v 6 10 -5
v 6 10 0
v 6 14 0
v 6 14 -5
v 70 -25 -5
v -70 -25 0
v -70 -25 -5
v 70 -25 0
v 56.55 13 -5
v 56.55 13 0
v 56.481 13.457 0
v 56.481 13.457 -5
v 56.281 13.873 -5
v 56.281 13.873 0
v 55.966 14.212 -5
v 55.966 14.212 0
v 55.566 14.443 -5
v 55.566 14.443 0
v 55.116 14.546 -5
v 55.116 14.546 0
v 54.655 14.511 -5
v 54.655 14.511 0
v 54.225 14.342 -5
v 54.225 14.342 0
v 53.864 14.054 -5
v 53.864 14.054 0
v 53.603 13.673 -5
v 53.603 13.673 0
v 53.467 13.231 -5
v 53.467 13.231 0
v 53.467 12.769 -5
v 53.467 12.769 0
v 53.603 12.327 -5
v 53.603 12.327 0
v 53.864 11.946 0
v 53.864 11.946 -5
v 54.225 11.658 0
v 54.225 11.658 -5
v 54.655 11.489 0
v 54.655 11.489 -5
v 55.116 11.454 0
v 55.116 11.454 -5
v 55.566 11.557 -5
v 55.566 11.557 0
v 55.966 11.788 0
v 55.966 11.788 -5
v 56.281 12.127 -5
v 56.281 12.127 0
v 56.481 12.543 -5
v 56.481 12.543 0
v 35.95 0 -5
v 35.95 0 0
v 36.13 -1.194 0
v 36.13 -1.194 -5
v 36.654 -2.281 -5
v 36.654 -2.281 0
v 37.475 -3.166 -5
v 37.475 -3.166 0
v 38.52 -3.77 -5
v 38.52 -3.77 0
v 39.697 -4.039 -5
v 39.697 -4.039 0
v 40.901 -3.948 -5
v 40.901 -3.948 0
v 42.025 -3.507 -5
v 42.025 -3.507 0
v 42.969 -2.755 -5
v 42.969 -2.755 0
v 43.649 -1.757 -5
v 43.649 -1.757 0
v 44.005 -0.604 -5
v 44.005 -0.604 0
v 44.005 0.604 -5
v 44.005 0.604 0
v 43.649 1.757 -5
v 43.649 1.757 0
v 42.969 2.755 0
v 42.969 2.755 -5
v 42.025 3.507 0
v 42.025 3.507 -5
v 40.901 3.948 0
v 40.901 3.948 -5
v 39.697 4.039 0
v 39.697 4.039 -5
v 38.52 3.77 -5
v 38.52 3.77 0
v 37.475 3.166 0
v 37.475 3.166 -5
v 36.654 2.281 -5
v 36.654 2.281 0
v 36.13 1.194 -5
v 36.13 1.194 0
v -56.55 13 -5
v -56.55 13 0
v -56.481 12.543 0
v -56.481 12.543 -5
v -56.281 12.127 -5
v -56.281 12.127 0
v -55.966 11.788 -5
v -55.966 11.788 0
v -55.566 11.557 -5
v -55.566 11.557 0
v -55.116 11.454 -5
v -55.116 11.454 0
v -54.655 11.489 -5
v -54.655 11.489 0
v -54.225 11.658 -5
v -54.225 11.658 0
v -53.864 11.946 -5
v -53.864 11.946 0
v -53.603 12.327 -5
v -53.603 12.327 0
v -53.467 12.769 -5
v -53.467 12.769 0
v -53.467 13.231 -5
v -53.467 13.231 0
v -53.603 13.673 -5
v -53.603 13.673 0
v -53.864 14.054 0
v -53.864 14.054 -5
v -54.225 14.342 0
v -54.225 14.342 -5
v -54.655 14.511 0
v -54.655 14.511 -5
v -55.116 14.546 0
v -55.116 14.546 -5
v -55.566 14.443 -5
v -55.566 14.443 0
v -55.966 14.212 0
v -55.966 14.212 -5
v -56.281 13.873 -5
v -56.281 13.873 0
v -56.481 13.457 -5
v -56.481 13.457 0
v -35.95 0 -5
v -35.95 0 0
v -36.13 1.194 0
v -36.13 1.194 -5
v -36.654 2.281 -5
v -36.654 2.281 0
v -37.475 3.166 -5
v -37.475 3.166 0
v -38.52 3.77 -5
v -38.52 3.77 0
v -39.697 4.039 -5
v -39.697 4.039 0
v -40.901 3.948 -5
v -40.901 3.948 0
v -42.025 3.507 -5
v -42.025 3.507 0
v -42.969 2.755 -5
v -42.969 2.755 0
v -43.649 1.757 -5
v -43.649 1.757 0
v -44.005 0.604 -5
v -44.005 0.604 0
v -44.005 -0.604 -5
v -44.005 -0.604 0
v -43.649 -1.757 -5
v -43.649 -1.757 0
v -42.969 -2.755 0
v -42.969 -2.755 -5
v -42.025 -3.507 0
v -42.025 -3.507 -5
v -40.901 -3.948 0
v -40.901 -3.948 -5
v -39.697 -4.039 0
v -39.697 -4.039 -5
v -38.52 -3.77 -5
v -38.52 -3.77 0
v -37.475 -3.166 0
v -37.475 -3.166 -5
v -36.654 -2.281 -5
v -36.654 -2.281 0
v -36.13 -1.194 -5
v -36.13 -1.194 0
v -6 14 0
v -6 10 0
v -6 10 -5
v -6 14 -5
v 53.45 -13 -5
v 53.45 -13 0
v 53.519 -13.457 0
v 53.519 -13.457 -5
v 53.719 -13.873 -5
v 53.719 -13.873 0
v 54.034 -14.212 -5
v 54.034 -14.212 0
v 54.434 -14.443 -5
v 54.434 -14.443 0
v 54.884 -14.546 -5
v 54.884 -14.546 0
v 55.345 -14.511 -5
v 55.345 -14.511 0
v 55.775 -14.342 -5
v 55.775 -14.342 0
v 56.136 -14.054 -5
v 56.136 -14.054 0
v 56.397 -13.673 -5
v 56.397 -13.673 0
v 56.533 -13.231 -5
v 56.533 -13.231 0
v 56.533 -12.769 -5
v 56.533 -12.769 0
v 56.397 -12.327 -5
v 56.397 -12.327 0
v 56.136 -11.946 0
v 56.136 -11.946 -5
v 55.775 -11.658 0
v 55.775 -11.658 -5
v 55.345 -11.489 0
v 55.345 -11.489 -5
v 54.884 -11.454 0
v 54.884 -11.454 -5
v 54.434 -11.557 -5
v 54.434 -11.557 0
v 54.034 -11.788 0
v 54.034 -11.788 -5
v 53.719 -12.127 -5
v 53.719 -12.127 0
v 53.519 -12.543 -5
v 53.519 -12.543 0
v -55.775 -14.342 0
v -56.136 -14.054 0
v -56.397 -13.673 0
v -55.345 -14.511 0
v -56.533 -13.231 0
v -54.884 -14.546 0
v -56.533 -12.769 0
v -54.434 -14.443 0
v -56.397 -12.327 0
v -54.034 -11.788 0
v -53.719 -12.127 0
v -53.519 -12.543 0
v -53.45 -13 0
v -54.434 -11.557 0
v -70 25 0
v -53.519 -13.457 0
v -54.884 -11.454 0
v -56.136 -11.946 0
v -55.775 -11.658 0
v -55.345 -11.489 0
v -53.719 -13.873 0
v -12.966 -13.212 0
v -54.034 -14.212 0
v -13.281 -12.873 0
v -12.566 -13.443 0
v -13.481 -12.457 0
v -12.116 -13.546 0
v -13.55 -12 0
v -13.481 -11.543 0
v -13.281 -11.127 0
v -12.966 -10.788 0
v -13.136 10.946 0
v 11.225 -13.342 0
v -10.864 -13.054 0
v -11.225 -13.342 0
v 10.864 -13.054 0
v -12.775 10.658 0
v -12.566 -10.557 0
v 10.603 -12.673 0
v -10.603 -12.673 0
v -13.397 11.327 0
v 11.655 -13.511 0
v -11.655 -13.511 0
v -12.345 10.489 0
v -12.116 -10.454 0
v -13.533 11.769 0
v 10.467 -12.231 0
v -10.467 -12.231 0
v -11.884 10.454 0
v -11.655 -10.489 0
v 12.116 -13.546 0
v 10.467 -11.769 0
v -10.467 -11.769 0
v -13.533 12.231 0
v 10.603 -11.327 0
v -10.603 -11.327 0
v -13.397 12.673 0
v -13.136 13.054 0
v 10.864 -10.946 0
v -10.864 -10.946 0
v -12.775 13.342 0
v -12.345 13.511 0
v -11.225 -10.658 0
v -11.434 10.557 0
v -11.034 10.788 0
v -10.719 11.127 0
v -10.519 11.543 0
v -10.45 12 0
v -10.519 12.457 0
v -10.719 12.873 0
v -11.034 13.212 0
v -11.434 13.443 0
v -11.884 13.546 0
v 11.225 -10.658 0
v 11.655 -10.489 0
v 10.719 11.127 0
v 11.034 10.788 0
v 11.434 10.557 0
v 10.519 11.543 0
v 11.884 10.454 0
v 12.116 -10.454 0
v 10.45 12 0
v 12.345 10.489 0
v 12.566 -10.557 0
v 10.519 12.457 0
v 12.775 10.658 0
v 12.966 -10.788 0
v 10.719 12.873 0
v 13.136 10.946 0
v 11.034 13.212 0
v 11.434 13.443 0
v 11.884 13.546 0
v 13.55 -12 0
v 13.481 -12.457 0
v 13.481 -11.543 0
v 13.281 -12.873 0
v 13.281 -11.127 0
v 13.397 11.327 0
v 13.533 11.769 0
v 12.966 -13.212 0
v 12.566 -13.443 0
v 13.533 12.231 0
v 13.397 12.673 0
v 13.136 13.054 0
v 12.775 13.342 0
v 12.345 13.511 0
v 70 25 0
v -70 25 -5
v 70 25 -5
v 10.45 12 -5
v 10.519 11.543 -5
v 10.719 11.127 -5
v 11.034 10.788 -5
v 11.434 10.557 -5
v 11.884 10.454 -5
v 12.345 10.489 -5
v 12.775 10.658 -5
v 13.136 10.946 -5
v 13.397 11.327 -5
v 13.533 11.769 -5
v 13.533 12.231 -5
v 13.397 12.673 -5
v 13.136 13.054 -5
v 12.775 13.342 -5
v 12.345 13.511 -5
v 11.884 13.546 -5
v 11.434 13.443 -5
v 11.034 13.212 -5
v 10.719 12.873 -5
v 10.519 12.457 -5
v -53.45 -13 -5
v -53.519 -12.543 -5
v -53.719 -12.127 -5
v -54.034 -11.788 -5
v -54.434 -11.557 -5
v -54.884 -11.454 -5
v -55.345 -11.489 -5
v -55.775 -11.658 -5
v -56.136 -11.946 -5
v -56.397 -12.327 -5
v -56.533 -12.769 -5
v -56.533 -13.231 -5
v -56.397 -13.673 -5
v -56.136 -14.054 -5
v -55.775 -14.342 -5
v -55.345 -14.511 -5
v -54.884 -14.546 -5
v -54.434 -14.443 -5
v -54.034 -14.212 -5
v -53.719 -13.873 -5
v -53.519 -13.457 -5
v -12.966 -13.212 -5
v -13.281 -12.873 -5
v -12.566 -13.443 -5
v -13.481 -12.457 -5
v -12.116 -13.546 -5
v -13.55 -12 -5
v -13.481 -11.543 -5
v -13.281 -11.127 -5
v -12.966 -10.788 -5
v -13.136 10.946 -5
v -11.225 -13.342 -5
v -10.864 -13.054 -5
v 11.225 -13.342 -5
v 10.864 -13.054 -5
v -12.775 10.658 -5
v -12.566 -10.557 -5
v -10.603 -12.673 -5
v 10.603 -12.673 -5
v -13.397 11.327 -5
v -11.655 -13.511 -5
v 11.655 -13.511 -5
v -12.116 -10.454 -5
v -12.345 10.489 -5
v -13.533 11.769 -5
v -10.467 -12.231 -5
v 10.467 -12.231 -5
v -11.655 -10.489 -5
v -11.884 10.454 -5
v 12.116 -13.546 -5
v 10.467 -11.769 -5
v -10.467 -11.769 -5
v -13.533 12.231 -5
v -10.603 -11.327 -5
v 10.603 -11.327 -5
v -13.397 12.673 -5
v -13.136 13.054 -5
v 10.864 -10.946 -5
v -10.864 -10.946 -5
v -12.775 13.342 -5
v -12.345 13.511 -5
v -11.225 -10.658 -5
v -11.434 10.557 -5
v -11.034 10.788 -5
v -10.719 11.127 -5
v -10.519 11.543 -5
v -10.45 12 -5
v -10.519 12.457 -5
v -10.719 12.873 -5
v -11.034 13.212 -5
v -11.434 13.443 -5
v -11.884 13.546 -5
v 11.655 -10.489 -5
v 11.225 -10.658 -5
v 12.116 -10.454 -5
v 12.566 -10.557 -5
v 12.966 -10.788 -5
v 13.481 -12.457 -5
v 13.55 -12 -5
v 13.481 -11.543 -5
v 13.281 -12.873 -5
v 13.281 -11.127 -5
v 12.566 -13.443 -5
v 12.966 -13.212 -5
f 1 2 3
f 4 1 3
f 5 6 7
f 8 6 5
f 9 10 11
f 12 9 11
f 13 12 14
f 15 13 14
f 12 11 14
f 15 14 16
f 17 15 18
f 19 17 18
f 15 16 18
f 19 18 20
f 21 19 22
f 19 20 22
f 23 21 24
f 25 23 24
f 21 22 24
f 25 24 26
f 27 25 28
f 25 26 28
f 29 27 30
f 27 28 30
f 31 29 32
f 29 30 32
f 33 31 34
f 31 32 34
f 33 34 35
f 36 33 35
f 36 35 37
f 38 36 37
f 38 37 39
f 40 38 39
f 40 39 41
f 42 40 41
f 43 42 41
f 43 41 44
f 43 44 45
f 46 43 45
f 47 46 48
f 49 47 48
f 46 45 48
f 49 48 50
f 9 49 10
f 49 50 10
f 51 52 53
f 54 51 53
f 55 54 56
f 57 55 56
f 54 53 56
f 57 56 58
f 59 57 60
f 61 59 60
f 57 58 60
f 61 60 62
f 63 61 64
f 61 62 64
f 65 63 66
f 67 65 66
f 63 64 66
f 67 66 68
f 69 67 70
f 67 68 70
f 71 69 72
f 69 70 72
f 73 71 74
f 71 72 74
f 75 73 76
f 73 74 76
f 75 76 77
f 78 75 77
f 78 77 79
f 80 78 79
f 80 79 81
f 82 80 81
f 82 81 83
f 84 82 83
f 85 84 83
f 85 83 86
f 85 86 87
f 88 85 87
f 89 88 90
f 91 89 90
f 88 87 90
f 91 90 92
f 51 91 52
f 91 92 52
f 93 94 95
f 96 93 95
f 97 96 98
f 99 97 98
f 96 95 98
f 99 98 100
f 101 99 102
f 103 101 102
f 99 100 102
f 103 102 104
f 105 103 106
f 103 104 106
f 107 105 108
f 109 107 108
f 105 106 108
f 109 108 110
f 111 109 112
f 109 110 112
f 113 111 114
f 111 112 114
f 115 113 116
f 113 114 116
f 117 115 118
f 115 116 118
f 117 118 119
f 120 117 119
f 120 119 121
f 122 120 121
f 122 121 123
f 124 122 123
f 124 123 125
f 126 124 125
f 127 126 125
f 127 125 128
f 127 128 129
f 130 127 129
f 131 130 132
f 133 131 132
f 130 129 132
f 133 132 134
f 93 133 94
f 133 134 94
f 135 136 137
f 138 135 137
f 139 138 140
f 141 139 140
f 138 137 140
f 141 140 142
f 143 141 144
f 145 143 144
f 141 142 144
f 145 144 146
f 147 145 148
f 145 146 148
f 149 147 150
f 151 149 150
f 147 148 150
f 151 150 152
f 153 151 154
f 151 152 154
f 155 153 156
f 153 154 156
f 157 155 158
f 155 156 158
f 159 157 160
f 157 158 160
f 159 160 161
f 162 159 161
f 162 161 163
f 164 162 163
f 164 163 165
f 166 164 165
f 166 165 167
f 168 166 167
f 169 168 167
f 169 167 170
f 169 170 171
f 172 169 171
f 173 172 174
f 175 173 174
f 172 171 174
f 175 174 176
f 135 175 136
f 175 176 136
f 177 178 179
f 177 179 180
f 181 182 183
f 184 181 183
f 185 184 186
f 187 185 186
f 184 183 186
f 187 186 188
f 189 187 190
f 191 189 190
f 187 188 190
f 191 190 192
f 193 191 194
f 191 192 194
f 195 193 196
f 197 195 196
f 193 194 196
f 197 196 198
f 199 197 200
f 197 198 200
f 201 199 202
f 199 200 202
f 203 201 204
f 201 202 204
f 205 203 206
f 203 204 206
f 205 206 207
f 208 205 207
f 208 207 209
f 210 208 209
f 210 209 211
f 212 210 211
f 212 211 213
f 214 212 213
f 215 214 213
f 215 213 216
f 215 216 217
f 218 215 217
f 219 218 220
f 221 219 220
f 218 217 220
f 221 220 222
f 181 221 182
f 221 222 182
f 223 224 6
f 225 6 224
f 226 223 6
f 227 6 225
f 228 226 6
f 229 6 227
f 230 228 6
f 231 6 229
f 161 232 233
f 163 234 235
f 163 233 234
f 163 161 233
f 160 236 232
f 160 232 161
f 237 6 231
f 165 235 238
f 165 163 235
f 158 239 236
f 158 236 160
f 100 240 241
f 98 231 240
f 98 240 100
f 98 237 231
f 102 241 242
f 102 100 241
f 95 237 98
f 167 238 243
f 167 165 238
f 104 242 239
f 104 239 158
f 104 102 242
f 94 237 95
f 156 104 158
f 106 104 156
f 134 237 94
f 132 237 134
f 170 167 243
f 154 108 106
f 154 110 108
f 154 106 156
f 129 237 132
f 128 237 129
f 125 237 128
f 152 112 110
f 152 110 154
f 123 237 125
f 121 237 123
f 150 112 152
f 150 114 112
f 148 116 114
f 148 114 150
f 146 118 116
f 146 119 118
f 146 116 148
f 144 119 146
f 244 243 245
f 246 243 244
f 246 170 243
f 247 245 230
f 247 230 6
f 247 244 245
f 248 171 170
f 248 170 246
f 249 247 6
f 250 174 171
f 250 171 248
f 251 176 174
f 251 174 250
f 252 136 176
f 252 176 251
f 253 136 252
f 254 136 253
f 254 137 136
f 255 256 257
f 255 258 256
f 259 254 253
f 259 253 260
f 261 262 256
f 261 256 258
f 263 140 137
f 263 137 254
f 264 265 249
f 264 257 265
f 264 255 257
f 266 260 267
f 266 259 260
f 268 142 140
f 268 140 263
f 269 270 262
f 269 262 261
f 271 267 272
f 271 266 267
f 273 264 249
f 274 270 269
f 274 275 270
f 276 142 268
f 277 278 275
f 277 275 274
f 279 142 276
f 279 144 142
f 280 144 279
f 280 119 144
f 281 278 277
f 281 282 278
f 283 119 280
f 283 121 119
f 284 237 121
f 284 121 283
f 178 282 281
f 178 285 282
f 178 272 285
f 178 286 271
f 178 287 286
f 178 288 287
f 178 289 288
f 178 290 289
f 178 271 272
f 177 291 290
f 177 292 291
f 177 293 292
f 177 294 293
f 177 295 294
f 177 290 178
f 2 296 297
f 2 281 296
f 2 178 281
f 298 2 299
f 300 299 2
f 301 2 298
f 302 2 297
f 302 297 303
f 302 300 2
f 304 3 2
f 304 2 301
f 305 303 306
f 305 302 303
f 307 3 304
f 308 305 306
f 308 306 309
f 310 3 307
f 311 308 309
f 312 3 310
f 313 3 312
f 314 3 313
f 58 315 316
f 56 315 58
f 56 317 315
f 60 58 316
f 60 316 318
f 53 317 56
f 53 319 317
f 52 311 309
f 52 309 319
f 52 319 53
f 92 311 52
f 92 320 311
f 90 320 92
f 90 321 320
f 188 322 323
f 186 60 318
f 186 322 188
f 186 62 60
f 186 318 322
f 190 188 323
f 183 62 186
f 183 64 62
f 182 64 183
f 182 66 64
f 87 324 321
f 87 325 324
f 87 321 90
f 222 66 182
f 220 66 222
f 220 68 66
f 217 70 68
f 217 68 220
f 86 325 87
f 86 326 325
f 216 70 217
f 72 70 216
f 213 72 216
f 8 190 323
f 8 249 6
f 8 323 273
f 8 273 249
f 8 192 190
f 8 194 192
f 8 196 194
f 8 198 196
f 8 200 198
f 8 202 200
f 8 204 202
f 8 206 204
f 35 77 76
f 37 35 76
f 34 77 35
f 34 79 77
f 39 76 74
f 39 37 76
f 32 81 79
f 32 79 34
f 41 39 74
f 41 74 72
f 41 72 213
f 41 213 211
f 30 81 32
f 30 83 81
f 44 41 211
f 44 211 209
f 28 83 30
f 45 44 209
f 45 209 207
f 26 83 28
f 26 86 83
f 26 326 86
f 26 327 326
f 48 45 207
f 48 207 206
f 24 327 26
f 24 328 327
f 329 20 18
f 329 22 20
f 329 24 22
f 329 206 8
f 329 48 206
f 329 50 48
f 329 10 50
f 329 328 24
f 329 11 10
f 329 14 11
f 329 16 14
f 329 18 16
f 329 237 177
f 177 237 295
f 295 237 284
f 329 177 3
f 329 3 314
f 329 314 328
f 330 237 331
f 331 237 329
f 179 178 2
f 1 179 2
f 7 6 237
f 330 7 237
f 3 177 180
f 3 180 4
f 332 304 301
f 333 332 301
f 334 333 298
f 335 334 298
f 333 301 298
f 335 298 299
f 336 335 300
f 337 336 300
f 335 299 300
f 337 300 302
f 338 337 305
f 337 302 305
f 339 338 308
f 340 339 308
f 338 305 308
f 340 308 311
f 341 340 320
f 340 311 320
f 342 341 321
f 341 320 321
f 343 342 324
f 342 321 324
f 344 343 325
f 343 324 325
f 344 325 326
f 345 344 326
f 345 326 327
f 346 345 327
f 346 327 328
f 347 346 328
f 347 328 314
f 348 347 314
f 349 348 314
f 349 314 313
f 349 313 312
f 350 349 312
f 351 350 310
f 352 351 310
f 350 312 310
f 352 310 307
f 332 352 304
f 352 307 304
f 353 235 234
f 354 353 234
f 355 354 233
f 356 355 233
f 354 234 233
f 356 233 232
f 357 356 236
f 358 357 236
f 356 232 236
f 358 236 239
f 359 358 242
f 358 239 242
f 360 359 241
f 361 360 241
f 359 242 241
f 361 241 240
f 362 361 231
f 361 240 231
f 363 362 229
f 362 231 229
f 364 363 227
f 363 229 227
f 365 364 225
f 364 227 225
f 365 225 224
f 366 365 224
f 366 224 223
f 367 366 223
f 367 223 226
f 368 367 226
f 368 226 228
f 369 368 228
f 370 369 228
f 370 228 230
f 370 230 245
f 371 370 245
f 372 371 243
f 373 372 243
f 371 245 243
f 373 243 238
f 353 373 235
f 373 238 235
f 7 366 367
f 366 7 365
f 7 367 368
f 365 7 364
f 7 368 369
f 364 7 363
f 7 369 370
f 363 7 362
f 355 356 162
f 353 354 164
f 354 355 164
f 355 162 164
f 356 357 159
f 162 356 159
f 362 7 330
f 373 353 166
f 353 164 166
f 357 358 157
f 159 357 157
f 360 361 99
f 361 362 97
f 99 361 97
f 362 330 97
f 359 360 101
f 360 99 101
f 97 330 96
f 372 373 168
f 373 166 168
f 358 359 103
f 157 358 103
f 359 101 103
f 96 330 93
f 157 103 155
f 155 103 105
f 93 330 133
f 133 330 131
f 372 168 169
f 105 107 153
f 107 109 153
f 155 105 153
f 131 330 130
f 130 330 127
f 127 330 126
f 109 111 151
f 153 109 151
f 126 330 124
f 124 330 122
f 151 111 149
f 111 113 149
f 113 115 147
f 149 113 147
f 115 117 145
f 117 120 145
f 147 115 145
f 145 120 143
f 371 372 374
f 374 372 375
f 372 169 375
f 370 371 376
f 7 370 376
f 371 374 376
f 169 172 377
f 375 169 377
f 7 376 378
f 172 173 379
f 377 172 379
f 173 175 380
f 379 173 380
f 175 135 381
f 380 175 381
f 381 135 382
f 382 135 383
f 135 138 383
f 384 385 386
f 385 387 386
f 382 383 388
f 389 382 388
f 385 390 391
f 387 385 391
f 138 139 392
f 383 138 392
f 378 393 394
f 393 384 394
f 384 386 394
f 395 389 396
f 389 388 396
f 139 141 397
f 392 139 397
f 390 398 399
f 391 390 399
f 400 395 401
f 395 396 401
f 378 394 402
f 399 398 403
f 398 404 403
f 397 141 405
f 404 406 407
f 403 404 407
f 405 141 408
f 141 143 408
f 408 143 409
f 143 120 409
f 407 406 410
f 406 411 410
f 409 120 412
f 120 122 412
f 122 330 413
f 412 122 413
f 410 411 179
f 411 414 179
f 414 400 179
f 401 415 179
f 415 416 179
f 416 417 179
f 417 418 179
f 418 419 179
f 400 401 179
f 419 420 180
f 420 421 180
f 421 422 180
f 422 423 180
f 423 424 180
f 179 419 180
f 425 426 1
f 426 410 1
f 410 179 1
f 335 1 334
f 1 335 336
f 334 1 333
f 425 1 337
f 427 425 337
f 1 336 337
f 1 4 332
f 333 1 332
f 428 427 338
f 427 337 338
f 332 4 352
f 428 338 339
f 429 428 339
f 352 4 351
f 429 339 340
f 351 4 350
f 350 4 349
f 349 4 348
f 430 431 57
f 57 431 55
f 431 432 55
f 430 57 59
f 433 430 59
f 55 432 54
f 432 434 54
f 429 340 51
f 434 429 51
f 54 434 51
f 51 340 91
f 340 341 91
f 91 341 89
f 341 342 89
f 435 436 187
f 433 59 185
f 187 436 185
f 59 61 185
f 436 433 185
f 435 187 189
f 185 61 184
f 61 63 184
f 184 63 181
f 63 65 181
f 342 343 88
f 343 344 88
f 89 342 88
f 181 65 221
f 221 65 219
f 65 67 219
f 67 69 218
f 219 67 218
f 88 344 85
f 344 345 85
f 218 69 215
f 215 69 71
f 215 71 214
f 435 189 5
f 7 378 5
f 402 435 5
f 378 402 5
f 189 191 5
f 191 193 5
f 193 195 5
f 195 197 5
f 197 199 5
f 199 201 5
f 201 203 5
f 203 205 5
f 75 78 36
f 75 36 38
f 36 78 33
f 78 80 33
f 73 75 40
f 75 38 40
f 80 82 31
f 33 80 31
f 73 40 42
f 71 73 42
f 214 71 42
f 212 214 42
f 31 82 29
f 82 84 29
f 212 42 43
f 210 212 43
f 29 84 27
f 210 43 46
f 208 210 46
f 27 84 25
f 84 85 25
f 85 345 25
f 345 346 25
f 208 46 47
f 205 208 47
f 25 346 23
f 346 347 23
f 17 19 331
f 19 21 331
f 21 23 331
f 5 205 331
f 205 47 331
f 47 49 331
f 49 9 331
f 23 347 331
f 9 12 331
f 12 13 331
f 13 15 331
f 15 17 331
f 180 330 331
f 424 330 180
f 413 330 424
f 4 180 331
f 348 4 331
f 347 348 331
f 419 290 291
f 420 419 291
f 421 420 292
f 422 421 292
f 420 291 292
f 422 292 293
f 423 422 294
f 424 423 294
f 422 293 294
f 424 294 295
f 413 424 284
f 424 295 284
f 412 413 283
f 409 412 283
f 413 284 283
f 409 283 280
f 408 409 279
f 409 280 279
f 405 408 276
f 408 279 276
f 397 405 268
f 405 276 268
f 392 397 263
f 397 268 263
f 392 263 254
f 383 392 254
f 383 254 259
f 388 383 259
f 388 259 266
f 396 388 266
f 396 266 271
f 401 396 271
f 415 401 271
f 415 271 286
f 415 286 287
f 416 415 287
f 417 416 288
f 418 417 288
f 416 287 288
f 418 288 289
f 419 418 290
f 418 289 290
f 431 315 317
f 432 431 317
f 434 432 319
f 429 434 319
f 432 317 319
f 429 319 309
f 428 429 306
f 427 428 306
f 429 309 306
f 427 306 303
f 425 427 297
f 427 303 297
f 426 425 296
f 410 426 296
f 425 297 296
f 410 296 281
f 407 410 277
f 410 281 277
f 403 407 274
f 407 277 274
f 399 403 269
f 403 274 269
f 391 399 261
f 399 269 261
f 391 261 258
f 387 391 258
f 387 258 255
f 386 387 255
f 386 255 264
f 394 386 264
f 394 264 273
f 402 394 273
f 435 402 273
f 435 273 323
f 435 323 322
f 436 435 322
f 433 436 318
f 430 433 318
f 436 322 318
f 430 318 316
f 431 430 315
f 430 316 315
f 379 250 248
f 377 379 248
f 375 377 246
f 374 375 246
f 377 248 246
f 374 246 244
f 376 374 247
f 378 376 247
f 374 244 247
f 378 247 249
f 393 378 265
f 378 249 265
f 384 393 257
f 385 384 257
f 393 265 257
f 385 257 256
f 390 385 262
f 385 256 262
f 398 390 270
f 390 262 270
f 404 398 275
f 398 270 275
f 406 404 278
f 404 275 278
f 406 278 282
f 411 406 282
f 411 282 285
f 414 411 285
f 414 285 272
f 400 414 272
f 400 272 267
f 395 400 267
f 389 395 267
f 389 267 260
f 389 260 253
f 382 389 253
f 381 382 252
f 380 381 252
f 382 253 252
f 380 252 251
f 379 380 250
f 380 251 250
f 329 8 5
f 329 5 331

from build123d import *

# Parameters (mm, degrees)
ESQUISSE1_W        = 140
ESQUISSE1_H        = 50
ESQUISSE1_R        = 4.05
ESQUISSE1_R_2      = 1.55
ESQUISSE1_W_2      = 12
ESQUISSE1_H_2      = 4
BOSS_EXTRU_1_DEPTH = 5


with BuildPart() as part:
    # Esquisse1 → Boss.-Extru.1 (new body)
    with BuildSketch(Plane.XY):
        Rectangle(ESQUISSE1_W, ESQUISSE1_H)
        with Locations((-40, 0)):
            Circle(ESQUISSE1_R, mode=Mode.SUBTRACT)
        with Locations((-55, -13)):
            Circle(ESQUISSE1_R_2, mode=Mode.SUBTRACT)
        with Locations(Location((-55, 13, 0), (0, 0, 180))):
            Circle(ESQUISSE1_R_2, mode=Mode.SUBTRACT)
        with Locations(Location((55, -13, 0), (0, 0, 180))):
            Circle(ESQUISSE1_R_2, mode=Mode.SUBTRACT)
        with Locations((55, 13)):
            Circle(ESQUISSE1_R_2, mode=Mode.SUBTRACT)
        with Locations(Location((40, 0, 0), (0, 0, 180))):
            Circle(ESQUISSE1_R, mode=Mode.SUBTRACT)
        with Locations((-12, 12)):
            Circle(ESQUISSE1_R_2, mode=Mode.SUBTRACT)
        with Locations(Location((-12, -12, 0), (0, 0, 180))):
            Circle(ESQUISSE1_R_2, mode=Mode.SUBTRACT)
        with Locations((12, -12)):
            Circle(ESQUISSE1_R_2, mode=Mode.SUBTRACT)
        with Locations(Location((12, 12, 0), (0, 0, 180))):
            Circle(ESQUISSE1_R_2, mode=Mode.SUBTRACT)
        with Locations((0, 12)):
            Rectangle(ESQUISSE1_W_2, ESQUISSE1_H_2, mode=Mode.SUBTRACT)
    extrude(amount=-BOSS_EXTRU_1_DEPTH)


solid = part.part
